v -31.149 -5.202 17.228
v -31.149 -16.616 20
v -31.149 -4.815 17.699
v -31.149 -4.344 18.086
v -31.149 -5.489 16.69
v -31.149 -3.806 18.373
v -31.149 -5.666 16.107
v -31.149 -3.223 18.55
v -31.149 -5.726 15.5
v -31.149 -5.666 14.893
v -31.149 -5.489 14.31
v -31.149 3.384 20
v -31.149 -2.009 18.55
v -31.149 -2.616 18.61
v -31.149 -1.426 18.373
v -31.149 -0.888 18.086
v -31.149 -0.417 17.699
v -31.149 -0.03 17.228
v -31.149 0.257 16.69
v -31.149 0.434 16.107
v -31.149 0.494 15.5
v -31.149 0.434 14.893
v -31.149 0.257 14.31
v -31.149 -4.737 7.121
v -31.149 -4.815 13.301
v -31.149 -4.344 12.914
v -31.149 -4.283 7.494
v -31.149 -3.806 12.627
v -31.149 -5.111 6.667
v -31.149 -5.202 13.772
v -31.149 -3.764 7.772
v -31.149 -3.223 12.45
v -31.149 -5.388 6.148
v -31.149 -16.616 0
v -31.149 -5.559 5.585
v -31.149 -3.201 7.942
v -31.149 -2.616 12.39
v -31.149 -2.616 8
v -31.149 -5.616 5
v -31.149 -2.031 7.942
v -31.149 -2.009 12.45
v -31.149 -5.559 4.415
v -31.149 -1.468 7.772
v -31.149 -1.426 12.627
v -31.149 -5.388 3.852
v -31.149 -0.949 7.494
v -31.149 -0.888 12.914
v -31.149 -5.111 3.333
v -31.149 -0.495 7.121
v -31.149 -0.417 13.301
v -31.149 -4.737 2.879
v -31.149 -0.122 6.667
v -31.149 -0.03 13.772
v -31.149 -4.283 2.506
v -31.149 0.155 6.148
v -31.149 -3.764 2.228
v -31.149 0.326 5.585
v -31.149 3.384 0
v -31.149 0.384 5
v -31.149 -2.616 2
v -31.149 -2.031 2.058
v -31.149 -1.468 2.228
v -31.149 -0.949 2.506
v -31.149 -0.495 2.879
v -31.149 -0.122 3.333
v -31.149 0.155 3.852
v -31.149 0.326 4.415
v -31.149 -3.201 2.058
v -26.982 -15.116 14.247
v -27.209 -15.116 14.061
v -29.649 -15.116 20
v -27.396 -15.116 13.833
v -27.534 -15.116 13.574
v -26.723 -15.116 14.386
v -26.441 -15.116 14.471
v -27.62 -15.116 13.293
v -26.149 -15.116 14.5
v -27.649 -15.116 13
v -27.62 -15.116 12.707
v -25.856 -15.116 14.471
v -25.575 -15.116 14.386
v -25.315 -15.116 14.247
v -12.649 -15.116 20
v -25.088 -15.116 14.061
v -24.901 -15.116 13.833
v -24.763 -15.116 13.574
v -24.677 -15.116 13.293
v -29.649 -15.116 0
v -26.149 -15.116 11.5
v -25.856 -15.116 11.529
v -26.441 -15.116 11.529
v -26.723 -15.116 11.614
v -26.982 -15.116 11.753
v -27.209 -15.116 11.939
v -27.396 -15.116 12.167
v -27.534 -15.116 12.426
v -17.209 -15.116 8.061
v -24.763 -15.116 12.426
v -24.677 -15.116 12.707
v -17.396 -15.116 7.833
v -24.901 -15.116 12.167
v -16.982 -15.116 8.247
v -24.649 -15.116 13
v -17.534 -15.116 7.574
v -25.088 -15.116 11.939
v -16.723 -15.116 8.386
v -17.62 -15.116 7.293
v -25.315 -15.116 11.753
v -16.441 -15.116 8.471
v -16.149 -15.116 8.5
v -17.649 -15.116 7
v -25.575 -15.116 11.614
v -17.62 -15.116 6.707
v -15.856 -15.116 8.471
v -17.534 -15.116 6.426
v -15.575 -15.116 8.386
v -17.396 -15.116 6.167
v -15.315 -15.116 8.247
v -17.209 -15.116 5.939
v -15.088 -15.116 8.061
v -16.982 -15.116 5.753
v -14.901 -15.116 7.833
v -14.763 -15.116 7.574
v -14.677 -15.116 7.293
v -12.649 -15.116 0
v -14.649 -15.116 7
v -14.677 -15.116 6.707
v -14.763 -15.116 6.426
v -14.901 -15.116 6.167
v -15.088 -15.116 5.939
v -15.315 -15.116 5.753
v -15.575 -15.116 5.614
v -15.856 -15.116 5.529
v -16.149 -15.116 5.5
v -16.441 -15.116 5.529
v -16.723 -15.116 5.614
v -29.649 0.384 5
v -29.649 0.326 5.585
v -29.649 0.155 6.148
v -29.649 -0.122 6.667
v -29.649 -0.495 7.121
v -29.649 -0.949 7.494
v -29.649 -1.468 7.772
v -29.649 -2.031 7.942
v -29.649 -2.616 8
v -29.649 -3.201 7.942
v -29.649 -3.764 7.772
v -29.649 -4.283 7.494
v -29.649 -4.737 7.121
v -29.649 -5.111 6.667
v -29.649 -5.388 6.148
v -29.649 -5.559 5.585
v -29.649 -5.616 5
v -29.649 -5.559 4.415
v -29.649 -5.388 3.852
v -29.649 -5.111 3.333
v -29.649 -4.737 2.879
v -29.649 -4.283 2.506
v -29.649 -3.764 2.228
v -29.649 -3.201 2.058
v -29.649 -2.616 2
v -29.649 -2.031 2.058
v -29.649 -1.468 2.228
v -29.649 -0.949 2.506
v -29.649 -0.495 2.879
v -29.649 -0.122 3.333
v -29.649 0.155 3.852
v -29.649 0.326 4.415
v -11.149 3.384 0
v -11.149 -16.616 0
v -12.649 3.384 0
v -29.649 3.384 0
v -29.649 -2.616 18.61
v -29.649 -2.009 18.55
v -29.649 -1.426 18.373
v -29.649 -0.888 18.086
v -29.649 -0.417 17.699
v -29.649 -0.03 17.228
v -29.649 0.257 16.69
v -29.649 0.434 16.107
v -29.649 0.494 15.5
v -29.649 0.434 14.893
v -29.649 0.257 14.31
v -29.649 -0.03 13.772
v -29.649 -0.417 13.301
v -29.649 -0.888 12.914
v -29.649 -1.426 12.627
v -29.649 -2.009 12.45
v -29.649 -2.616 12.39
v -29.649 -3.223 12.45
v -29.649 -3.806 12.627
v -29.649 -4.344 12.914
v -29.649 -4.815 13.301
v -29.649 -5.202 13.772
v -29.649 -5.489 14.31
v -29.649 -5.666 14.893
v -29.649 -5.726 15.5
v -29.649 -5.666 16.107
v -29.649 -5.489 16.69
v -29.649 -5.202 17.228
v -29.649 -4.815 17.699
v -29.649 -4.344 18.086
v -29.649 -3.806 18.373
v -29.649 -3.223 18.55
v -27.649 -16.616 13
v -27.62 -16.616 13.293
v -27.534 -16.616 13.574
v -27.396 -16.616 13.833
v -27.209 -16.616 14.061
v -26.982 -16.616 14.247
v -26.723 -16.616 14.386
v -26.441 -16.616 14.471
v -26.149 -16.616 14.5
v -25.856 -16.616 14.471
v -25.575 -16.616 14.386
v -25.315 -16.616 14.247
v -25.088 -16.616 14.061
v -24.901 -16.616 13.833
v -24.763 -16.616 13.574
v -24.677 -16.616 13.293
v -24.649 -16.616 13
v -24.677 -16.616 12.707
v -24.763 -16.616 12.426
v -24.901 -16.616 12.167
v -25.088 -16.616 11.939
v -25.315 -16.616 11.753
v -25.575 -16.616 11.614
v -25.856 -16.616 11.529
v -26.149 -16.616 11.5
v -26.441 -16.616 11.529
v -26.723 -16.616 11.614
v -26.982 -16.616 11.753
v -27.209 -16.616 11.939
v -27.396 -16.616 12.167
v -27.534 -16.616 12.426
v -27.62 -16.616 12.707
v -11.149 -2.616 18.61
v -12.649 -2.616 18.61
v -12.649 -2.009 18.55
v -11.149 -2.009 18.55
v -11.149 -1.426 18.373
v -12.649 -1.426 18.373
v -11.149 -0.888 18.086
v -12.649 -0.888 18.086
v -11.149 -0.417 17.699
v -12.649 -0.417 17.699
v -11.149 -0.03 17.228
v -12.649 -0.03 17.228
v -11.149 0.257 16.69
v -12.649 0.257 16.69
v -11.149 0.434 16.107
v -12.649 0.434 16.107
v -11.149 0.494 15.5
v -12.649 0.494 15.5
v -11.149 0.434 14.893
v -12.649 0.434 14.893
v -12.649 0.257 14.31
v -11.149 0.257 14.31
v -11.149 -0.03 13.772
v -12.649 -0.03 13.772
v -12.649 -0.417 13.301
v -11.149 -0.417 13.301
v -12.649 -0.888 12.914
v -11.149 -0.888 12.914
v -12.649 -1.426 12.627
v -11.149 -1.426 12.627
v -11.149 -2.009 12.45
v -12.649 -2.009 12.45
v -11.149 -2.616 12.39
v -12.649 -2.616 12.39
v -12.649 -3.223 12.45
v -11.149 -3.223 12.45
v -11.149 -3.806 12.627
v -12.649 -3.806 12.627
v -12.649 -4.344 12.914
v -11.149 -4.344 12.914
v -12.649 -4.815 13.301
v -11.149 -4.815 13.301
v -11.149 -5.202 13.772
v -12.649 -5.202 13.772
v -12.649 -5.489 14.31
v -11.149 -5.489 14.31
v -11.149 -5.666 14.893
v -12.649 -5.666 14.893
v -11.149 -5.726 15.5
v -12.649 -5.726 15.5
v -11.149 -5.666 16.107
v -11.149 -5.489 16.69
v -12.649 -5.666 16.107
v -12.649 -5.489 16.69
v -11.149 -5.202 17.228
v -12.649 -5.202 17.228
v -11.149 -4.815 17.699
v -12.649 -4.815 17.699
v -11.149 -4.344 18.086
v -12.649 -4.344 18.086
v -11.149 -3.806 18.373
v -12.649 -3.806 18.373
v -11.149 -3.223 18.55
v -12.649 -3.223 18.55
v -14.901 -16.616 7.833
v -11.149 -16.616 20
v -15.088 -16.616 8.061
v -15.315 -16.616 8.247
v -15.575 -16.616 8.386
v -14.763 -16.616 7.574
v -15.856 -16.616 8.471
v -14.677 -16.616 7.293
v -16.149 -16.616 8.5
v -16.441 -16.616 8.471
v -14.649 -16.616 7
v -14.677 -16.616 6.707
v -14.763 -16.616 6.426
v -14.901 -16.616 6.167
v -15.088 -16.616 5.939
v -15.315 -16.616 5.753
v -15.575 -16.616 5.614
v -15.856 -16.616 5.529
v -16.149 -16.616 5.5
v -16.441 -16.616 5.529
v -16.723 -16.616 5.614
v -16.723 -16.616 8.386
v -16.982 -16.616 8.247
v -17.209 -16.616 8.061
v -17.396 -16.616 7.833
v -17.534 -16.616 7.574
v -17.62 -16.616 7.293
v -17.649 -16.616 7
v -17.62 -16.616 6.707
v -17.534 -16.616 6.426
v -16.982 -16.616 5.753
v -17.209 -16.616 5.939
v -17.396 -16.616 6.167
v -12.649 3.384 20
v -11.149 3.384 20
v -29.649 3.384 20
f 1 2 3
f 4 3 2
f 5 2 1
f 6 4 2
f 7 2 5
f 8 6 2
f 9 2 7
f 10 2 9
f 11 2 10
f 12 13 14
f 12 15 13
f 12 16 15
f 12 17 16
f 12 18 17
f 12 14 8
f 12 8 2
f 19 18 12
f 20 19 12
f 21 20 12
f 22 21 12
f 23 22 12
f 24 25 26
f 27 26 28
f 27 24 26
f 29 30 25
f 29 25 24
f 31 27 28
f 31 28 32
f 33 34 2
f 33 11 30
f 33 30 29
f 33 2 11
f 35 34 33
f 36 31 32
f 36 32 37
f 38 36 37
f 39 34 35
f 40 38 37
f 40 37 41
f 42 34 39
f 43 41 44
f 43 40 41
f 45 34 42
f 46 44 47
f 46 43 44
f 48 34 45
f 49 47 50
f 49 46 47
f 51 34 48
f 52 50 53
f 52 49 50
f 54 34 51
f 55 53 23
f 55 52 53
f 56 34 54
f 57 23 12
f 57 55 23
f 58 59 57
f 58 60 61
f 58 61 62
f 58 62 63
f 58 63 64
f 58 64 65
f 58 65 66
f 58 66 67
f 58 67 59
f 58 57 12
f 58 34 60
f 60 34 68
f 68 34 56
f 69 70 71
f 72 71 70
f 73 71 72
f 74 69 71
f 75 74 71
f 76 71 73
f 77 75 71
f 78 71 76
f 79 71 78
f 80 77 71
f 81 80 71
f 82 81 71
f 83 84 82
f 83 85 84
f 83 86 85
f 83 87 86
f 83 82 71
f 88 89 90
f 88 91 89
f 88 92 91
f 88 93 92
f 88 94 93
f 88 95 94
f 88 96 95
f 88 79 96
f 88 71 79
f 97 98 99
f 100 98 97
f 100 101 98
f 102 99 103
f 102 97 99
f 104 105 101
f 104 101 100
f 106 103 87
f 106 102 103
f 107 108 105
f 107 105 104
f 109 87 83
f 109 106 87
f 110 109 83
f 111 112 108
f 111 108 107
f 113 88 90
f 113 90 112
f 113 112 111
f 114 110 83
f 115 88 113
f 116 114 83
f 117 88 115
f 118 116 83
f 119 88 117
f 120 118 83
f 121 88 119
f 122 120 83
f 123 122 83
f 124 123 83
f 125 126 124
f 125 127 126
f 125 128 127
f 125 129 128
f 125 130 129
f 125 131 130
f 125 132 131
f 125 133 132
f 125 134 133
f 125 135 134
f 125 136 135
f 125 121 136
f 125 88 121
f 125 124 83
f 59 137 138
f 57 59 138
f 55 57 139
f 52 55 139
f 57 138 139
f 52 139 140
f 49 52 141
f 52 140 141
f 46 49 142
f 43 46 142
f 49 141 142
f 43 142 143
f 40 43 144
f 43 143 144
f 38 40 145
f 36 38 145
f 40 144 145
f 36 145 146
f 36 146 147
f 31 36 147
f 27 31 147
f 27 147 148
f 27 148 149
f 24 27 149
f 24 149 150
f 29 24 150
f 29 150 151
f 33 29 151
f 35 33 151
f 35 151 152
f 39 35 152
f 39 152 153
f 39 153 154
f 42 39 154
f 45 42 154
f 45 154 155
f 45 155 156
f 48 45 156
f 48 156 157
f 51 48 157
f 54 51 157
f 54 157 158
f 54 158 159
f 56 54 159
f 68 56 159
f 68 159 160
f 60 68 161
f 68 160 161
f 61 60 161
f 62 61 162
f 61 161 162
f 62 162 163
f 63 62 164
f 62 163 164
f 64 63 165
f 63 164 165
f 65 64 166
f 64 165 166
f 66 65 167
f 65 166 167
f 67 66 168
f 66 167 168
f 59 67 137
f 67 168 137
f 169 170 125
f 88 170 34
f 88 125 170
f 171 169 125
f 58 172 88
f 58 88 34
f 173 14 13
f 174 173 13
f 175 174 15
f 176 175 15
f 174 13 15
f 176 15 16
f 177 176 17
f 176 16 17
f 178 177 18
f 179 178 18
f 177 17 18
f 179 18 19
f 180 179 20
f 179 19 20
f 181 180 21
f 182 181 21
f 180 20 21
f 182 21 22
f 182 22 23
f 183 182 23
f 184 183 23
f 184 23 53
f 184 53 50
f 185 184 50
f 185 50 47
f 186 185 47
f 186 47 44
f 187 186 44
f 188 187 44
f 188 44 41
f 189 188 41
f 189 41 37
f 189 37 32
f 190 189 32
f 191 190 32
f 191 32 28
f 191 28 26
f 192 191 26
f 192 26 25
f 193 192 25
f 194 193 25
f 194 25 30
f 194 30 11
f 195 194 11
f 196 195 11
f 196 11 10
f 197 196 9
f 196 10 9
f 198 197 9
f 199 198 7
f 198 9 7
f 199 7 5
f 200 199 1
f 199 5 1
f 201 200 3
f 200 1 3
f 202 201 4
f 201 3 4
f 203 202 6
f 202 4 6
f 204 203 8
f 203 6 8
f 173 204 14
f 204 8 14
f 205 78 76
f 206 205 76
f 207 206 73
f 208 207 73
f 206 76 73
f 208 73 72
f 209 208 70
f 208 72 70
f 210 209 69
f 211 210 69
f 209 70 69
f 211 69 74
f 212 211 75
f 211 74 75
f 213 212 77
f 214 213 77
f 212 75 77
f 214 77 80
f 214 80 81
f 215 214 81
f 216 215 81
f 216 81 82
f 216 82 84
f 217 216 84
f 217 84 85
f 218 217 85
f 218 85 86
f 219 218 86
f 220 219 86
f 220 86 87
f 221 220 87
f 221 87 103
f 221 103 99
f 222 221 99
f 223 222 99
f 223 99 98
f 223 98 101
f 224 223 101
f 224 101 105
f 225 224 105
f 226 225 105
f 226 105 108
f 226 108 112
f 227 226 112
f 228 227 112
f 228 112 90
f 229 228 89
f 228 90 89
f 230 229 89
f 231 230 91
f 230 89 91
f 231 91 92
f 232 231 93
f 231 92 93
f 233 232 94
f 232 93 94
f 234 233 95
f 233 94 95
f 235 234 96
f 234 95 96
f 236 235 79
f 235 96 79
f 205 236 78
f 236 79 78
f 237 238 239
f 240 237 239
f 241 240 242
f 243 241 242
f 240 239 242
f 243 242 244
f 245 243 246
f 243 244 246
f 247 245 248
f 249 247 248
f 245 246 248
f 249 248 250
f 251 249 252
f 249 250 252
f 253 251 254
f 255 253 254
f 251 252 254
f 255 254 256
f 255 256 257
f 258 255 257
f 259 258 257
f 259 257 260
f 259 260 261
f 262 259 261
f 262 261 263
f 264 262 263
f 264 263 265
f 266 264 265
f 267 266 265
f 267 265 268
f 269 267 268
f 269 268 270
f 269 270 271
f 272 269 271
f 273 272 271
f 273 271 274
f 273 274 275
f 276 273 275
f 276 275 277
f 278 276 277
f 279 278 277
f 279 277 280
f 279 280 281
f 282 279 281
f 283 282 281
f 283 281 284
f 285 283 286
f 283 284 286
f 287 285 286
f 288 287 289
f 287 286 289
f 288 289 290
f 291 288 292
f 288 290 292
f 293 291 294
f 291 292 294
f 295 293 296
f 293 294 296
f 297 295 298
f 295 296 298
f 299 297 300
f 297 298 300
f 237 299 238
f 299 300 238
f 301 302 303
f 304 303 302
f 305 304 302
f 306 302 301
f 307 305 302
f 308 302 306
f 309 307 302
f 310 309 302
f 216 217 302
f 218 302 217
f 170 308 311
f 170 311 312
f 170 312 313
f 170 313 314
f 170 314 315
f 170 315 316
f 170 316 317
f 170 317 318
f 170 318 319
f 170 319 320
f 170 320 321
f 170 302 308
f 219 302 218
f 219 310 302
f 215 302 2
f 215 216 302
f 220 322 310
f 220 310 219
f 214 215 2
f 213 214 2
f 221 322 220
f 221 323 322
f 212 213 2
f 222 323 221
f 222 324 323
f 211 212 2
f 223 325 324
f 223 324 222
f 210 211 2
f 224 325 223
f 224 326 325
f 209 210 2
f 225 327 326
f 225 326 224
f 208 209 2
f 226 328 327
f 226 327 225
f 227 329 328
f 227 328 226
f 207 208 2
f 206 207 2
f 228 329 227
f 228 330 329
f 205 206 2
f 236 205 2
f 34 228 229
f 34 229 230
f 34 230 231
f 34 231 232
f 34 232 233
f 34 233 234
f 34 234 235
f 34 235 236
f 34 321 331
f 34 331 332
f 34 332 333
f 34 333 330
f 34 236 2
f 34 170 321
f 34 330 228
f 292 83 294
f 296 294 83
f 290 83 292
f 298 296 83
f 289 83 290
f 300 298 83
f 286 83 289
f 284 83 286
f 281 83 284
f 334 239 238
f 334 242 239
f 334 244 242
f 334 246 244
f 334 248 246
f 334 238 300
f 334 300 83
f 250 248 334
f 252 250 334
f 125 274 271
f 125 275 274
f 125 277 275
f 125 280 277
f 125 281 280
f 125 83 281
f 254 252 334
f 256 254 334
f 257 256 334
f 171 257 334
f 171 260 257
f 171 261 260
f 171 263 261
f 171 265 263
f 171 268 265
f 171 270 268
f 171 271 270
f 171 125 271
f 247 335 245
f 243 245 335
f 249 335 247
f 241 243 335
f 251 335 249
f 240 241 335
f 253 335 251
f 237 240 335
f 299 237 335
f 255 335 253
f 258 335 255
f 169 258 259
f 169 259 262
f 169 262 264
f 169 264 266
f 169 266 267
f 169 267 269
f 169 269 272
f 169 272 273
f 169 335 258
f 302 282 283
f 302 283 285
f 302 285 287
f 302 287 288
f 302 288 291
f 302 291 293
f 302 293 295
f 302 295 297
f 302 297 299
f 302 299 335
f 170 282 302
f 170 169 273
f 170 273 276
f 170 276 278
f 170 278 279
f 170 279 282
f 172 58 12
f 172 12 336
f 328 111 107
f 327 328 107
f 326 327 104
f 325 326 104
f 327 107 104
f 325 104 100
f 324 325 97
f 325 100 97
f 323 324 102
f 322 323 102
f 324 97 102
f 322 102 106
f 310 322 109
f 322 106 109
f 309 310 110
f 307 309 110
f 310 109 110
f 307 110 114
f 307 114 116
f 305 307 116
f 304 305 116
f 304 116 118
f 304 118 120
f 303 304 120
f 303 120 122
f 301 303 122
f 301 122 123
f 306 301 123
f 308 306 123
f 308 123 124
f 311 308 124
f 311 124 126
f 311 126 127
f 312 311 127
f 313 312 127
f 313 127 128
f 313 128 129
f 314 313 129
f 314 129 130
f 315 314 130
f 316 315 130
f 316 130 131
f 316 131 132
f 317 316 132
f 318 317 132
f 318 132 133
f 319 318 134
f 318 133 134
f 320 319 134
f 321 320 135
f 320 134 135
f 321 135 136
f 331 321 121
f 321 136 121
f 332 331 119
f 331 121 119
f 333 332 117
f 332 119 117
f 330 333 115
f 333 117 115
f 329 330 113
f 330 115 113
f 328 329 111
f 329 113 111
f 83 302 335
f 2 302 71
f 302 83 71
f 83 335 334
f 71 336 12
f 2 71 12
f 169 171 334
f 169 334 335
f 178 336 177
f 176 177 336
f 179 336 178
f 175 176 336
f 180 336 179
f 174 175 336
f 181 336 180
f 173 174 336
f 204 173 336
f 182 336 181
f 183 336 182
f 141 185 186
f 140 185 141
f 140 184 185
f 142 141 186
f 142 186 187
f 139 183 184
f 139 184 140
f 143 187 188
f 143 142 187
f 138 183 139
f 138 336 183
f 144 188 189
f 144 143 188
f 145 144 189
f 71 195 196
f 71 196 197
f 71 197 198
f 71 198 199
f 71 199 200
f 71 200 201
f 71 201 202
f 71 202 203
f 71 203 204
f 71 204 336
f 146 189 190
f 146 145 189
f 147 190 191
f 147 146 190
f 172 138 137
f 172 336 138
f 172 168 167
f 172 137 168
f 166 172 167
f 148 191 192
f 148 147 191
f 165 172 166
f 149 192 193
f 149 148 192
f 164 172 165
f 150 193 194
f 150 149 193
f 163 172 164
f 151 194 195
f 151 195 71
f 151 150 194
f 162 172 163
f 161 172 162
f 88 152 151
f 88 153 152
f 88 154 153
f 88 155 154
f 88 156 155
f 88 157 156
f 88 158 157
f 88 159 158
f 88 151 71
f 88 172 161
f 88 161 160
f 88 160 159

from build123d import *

# Parameters (mm, degrees)
EXTRUSION1_DEPTH = 20
ESQUISSE2_R      = 1.5
EXTRUSION2_DEPTH = 42.382154348
ESQUISSE4_R      = 3
EXTRUSION3_DEPTH = 32.911544508
ESQUISSE5_R      = 3.11
EXTRUSION4_DEPTH = 33.803912463


with BuildPart() as part:
    # Esquisse1 → Extrusion1 (new body)
    with BuildSketch(Plane.XY):
        Polygon((-31.14855853, 3.383843017), (-29.64855853, 3.383843017), (-29.64855853, -15.116156983), (-12.64855853, -15.116156983), (-12.64855853, 3.383843017), (-11.14855853, 3.383843017), (-11.14855853, -16.616156983), (-31.14855853, -16.616156983), align=None)
    extrude(amount=EXTRUSION1_DEPTH)

    # Esquisse2 → Extrusion2 (cut, through all)
    with BuildSketch(Plane(origin=(0, -15.116156983, 0), x_dir=(-1, 0, 0), z_dir=(0, 1, 0))):
        with Locations((26.14855853, 13)):
            Circle(ESQUISSE2_R)
        with Locations((16.14855853, 7)):
            Circle(ESQUISSE2_R)
    extrude(amount=-EXTRUSION2_DEPTH, mode=Mode.SUBTRACT)

    # Esquisse4 → Extrusion3 (cut, through all)
    with BuildSketch(Plane(origin=(-29.64855853, 0, 0), x_dir=(0, 0, -1), z_dir=(1, 0, 0))):
        with Locations(Location((-5, -2.616156983, 0), (0, 0, 90))):
            Circle(ESQUISSE4_R)
    extrude(amount=-EXTRUSION3_DEPTH, mode=Mode.SUBTRACT)

    # Esquisse5 → Extrusion4 (cut, through all)
    with BuildSketch(Plane.ZY.offset(31.14855853)):
        with Locations((15.5, -2.616156983)):
            Circle(ESQUISSE5_R)
    extrude(amount=-EXTRUSION4_DEPTH, mode=Mode.SUBTRACT)


solid = part.part
